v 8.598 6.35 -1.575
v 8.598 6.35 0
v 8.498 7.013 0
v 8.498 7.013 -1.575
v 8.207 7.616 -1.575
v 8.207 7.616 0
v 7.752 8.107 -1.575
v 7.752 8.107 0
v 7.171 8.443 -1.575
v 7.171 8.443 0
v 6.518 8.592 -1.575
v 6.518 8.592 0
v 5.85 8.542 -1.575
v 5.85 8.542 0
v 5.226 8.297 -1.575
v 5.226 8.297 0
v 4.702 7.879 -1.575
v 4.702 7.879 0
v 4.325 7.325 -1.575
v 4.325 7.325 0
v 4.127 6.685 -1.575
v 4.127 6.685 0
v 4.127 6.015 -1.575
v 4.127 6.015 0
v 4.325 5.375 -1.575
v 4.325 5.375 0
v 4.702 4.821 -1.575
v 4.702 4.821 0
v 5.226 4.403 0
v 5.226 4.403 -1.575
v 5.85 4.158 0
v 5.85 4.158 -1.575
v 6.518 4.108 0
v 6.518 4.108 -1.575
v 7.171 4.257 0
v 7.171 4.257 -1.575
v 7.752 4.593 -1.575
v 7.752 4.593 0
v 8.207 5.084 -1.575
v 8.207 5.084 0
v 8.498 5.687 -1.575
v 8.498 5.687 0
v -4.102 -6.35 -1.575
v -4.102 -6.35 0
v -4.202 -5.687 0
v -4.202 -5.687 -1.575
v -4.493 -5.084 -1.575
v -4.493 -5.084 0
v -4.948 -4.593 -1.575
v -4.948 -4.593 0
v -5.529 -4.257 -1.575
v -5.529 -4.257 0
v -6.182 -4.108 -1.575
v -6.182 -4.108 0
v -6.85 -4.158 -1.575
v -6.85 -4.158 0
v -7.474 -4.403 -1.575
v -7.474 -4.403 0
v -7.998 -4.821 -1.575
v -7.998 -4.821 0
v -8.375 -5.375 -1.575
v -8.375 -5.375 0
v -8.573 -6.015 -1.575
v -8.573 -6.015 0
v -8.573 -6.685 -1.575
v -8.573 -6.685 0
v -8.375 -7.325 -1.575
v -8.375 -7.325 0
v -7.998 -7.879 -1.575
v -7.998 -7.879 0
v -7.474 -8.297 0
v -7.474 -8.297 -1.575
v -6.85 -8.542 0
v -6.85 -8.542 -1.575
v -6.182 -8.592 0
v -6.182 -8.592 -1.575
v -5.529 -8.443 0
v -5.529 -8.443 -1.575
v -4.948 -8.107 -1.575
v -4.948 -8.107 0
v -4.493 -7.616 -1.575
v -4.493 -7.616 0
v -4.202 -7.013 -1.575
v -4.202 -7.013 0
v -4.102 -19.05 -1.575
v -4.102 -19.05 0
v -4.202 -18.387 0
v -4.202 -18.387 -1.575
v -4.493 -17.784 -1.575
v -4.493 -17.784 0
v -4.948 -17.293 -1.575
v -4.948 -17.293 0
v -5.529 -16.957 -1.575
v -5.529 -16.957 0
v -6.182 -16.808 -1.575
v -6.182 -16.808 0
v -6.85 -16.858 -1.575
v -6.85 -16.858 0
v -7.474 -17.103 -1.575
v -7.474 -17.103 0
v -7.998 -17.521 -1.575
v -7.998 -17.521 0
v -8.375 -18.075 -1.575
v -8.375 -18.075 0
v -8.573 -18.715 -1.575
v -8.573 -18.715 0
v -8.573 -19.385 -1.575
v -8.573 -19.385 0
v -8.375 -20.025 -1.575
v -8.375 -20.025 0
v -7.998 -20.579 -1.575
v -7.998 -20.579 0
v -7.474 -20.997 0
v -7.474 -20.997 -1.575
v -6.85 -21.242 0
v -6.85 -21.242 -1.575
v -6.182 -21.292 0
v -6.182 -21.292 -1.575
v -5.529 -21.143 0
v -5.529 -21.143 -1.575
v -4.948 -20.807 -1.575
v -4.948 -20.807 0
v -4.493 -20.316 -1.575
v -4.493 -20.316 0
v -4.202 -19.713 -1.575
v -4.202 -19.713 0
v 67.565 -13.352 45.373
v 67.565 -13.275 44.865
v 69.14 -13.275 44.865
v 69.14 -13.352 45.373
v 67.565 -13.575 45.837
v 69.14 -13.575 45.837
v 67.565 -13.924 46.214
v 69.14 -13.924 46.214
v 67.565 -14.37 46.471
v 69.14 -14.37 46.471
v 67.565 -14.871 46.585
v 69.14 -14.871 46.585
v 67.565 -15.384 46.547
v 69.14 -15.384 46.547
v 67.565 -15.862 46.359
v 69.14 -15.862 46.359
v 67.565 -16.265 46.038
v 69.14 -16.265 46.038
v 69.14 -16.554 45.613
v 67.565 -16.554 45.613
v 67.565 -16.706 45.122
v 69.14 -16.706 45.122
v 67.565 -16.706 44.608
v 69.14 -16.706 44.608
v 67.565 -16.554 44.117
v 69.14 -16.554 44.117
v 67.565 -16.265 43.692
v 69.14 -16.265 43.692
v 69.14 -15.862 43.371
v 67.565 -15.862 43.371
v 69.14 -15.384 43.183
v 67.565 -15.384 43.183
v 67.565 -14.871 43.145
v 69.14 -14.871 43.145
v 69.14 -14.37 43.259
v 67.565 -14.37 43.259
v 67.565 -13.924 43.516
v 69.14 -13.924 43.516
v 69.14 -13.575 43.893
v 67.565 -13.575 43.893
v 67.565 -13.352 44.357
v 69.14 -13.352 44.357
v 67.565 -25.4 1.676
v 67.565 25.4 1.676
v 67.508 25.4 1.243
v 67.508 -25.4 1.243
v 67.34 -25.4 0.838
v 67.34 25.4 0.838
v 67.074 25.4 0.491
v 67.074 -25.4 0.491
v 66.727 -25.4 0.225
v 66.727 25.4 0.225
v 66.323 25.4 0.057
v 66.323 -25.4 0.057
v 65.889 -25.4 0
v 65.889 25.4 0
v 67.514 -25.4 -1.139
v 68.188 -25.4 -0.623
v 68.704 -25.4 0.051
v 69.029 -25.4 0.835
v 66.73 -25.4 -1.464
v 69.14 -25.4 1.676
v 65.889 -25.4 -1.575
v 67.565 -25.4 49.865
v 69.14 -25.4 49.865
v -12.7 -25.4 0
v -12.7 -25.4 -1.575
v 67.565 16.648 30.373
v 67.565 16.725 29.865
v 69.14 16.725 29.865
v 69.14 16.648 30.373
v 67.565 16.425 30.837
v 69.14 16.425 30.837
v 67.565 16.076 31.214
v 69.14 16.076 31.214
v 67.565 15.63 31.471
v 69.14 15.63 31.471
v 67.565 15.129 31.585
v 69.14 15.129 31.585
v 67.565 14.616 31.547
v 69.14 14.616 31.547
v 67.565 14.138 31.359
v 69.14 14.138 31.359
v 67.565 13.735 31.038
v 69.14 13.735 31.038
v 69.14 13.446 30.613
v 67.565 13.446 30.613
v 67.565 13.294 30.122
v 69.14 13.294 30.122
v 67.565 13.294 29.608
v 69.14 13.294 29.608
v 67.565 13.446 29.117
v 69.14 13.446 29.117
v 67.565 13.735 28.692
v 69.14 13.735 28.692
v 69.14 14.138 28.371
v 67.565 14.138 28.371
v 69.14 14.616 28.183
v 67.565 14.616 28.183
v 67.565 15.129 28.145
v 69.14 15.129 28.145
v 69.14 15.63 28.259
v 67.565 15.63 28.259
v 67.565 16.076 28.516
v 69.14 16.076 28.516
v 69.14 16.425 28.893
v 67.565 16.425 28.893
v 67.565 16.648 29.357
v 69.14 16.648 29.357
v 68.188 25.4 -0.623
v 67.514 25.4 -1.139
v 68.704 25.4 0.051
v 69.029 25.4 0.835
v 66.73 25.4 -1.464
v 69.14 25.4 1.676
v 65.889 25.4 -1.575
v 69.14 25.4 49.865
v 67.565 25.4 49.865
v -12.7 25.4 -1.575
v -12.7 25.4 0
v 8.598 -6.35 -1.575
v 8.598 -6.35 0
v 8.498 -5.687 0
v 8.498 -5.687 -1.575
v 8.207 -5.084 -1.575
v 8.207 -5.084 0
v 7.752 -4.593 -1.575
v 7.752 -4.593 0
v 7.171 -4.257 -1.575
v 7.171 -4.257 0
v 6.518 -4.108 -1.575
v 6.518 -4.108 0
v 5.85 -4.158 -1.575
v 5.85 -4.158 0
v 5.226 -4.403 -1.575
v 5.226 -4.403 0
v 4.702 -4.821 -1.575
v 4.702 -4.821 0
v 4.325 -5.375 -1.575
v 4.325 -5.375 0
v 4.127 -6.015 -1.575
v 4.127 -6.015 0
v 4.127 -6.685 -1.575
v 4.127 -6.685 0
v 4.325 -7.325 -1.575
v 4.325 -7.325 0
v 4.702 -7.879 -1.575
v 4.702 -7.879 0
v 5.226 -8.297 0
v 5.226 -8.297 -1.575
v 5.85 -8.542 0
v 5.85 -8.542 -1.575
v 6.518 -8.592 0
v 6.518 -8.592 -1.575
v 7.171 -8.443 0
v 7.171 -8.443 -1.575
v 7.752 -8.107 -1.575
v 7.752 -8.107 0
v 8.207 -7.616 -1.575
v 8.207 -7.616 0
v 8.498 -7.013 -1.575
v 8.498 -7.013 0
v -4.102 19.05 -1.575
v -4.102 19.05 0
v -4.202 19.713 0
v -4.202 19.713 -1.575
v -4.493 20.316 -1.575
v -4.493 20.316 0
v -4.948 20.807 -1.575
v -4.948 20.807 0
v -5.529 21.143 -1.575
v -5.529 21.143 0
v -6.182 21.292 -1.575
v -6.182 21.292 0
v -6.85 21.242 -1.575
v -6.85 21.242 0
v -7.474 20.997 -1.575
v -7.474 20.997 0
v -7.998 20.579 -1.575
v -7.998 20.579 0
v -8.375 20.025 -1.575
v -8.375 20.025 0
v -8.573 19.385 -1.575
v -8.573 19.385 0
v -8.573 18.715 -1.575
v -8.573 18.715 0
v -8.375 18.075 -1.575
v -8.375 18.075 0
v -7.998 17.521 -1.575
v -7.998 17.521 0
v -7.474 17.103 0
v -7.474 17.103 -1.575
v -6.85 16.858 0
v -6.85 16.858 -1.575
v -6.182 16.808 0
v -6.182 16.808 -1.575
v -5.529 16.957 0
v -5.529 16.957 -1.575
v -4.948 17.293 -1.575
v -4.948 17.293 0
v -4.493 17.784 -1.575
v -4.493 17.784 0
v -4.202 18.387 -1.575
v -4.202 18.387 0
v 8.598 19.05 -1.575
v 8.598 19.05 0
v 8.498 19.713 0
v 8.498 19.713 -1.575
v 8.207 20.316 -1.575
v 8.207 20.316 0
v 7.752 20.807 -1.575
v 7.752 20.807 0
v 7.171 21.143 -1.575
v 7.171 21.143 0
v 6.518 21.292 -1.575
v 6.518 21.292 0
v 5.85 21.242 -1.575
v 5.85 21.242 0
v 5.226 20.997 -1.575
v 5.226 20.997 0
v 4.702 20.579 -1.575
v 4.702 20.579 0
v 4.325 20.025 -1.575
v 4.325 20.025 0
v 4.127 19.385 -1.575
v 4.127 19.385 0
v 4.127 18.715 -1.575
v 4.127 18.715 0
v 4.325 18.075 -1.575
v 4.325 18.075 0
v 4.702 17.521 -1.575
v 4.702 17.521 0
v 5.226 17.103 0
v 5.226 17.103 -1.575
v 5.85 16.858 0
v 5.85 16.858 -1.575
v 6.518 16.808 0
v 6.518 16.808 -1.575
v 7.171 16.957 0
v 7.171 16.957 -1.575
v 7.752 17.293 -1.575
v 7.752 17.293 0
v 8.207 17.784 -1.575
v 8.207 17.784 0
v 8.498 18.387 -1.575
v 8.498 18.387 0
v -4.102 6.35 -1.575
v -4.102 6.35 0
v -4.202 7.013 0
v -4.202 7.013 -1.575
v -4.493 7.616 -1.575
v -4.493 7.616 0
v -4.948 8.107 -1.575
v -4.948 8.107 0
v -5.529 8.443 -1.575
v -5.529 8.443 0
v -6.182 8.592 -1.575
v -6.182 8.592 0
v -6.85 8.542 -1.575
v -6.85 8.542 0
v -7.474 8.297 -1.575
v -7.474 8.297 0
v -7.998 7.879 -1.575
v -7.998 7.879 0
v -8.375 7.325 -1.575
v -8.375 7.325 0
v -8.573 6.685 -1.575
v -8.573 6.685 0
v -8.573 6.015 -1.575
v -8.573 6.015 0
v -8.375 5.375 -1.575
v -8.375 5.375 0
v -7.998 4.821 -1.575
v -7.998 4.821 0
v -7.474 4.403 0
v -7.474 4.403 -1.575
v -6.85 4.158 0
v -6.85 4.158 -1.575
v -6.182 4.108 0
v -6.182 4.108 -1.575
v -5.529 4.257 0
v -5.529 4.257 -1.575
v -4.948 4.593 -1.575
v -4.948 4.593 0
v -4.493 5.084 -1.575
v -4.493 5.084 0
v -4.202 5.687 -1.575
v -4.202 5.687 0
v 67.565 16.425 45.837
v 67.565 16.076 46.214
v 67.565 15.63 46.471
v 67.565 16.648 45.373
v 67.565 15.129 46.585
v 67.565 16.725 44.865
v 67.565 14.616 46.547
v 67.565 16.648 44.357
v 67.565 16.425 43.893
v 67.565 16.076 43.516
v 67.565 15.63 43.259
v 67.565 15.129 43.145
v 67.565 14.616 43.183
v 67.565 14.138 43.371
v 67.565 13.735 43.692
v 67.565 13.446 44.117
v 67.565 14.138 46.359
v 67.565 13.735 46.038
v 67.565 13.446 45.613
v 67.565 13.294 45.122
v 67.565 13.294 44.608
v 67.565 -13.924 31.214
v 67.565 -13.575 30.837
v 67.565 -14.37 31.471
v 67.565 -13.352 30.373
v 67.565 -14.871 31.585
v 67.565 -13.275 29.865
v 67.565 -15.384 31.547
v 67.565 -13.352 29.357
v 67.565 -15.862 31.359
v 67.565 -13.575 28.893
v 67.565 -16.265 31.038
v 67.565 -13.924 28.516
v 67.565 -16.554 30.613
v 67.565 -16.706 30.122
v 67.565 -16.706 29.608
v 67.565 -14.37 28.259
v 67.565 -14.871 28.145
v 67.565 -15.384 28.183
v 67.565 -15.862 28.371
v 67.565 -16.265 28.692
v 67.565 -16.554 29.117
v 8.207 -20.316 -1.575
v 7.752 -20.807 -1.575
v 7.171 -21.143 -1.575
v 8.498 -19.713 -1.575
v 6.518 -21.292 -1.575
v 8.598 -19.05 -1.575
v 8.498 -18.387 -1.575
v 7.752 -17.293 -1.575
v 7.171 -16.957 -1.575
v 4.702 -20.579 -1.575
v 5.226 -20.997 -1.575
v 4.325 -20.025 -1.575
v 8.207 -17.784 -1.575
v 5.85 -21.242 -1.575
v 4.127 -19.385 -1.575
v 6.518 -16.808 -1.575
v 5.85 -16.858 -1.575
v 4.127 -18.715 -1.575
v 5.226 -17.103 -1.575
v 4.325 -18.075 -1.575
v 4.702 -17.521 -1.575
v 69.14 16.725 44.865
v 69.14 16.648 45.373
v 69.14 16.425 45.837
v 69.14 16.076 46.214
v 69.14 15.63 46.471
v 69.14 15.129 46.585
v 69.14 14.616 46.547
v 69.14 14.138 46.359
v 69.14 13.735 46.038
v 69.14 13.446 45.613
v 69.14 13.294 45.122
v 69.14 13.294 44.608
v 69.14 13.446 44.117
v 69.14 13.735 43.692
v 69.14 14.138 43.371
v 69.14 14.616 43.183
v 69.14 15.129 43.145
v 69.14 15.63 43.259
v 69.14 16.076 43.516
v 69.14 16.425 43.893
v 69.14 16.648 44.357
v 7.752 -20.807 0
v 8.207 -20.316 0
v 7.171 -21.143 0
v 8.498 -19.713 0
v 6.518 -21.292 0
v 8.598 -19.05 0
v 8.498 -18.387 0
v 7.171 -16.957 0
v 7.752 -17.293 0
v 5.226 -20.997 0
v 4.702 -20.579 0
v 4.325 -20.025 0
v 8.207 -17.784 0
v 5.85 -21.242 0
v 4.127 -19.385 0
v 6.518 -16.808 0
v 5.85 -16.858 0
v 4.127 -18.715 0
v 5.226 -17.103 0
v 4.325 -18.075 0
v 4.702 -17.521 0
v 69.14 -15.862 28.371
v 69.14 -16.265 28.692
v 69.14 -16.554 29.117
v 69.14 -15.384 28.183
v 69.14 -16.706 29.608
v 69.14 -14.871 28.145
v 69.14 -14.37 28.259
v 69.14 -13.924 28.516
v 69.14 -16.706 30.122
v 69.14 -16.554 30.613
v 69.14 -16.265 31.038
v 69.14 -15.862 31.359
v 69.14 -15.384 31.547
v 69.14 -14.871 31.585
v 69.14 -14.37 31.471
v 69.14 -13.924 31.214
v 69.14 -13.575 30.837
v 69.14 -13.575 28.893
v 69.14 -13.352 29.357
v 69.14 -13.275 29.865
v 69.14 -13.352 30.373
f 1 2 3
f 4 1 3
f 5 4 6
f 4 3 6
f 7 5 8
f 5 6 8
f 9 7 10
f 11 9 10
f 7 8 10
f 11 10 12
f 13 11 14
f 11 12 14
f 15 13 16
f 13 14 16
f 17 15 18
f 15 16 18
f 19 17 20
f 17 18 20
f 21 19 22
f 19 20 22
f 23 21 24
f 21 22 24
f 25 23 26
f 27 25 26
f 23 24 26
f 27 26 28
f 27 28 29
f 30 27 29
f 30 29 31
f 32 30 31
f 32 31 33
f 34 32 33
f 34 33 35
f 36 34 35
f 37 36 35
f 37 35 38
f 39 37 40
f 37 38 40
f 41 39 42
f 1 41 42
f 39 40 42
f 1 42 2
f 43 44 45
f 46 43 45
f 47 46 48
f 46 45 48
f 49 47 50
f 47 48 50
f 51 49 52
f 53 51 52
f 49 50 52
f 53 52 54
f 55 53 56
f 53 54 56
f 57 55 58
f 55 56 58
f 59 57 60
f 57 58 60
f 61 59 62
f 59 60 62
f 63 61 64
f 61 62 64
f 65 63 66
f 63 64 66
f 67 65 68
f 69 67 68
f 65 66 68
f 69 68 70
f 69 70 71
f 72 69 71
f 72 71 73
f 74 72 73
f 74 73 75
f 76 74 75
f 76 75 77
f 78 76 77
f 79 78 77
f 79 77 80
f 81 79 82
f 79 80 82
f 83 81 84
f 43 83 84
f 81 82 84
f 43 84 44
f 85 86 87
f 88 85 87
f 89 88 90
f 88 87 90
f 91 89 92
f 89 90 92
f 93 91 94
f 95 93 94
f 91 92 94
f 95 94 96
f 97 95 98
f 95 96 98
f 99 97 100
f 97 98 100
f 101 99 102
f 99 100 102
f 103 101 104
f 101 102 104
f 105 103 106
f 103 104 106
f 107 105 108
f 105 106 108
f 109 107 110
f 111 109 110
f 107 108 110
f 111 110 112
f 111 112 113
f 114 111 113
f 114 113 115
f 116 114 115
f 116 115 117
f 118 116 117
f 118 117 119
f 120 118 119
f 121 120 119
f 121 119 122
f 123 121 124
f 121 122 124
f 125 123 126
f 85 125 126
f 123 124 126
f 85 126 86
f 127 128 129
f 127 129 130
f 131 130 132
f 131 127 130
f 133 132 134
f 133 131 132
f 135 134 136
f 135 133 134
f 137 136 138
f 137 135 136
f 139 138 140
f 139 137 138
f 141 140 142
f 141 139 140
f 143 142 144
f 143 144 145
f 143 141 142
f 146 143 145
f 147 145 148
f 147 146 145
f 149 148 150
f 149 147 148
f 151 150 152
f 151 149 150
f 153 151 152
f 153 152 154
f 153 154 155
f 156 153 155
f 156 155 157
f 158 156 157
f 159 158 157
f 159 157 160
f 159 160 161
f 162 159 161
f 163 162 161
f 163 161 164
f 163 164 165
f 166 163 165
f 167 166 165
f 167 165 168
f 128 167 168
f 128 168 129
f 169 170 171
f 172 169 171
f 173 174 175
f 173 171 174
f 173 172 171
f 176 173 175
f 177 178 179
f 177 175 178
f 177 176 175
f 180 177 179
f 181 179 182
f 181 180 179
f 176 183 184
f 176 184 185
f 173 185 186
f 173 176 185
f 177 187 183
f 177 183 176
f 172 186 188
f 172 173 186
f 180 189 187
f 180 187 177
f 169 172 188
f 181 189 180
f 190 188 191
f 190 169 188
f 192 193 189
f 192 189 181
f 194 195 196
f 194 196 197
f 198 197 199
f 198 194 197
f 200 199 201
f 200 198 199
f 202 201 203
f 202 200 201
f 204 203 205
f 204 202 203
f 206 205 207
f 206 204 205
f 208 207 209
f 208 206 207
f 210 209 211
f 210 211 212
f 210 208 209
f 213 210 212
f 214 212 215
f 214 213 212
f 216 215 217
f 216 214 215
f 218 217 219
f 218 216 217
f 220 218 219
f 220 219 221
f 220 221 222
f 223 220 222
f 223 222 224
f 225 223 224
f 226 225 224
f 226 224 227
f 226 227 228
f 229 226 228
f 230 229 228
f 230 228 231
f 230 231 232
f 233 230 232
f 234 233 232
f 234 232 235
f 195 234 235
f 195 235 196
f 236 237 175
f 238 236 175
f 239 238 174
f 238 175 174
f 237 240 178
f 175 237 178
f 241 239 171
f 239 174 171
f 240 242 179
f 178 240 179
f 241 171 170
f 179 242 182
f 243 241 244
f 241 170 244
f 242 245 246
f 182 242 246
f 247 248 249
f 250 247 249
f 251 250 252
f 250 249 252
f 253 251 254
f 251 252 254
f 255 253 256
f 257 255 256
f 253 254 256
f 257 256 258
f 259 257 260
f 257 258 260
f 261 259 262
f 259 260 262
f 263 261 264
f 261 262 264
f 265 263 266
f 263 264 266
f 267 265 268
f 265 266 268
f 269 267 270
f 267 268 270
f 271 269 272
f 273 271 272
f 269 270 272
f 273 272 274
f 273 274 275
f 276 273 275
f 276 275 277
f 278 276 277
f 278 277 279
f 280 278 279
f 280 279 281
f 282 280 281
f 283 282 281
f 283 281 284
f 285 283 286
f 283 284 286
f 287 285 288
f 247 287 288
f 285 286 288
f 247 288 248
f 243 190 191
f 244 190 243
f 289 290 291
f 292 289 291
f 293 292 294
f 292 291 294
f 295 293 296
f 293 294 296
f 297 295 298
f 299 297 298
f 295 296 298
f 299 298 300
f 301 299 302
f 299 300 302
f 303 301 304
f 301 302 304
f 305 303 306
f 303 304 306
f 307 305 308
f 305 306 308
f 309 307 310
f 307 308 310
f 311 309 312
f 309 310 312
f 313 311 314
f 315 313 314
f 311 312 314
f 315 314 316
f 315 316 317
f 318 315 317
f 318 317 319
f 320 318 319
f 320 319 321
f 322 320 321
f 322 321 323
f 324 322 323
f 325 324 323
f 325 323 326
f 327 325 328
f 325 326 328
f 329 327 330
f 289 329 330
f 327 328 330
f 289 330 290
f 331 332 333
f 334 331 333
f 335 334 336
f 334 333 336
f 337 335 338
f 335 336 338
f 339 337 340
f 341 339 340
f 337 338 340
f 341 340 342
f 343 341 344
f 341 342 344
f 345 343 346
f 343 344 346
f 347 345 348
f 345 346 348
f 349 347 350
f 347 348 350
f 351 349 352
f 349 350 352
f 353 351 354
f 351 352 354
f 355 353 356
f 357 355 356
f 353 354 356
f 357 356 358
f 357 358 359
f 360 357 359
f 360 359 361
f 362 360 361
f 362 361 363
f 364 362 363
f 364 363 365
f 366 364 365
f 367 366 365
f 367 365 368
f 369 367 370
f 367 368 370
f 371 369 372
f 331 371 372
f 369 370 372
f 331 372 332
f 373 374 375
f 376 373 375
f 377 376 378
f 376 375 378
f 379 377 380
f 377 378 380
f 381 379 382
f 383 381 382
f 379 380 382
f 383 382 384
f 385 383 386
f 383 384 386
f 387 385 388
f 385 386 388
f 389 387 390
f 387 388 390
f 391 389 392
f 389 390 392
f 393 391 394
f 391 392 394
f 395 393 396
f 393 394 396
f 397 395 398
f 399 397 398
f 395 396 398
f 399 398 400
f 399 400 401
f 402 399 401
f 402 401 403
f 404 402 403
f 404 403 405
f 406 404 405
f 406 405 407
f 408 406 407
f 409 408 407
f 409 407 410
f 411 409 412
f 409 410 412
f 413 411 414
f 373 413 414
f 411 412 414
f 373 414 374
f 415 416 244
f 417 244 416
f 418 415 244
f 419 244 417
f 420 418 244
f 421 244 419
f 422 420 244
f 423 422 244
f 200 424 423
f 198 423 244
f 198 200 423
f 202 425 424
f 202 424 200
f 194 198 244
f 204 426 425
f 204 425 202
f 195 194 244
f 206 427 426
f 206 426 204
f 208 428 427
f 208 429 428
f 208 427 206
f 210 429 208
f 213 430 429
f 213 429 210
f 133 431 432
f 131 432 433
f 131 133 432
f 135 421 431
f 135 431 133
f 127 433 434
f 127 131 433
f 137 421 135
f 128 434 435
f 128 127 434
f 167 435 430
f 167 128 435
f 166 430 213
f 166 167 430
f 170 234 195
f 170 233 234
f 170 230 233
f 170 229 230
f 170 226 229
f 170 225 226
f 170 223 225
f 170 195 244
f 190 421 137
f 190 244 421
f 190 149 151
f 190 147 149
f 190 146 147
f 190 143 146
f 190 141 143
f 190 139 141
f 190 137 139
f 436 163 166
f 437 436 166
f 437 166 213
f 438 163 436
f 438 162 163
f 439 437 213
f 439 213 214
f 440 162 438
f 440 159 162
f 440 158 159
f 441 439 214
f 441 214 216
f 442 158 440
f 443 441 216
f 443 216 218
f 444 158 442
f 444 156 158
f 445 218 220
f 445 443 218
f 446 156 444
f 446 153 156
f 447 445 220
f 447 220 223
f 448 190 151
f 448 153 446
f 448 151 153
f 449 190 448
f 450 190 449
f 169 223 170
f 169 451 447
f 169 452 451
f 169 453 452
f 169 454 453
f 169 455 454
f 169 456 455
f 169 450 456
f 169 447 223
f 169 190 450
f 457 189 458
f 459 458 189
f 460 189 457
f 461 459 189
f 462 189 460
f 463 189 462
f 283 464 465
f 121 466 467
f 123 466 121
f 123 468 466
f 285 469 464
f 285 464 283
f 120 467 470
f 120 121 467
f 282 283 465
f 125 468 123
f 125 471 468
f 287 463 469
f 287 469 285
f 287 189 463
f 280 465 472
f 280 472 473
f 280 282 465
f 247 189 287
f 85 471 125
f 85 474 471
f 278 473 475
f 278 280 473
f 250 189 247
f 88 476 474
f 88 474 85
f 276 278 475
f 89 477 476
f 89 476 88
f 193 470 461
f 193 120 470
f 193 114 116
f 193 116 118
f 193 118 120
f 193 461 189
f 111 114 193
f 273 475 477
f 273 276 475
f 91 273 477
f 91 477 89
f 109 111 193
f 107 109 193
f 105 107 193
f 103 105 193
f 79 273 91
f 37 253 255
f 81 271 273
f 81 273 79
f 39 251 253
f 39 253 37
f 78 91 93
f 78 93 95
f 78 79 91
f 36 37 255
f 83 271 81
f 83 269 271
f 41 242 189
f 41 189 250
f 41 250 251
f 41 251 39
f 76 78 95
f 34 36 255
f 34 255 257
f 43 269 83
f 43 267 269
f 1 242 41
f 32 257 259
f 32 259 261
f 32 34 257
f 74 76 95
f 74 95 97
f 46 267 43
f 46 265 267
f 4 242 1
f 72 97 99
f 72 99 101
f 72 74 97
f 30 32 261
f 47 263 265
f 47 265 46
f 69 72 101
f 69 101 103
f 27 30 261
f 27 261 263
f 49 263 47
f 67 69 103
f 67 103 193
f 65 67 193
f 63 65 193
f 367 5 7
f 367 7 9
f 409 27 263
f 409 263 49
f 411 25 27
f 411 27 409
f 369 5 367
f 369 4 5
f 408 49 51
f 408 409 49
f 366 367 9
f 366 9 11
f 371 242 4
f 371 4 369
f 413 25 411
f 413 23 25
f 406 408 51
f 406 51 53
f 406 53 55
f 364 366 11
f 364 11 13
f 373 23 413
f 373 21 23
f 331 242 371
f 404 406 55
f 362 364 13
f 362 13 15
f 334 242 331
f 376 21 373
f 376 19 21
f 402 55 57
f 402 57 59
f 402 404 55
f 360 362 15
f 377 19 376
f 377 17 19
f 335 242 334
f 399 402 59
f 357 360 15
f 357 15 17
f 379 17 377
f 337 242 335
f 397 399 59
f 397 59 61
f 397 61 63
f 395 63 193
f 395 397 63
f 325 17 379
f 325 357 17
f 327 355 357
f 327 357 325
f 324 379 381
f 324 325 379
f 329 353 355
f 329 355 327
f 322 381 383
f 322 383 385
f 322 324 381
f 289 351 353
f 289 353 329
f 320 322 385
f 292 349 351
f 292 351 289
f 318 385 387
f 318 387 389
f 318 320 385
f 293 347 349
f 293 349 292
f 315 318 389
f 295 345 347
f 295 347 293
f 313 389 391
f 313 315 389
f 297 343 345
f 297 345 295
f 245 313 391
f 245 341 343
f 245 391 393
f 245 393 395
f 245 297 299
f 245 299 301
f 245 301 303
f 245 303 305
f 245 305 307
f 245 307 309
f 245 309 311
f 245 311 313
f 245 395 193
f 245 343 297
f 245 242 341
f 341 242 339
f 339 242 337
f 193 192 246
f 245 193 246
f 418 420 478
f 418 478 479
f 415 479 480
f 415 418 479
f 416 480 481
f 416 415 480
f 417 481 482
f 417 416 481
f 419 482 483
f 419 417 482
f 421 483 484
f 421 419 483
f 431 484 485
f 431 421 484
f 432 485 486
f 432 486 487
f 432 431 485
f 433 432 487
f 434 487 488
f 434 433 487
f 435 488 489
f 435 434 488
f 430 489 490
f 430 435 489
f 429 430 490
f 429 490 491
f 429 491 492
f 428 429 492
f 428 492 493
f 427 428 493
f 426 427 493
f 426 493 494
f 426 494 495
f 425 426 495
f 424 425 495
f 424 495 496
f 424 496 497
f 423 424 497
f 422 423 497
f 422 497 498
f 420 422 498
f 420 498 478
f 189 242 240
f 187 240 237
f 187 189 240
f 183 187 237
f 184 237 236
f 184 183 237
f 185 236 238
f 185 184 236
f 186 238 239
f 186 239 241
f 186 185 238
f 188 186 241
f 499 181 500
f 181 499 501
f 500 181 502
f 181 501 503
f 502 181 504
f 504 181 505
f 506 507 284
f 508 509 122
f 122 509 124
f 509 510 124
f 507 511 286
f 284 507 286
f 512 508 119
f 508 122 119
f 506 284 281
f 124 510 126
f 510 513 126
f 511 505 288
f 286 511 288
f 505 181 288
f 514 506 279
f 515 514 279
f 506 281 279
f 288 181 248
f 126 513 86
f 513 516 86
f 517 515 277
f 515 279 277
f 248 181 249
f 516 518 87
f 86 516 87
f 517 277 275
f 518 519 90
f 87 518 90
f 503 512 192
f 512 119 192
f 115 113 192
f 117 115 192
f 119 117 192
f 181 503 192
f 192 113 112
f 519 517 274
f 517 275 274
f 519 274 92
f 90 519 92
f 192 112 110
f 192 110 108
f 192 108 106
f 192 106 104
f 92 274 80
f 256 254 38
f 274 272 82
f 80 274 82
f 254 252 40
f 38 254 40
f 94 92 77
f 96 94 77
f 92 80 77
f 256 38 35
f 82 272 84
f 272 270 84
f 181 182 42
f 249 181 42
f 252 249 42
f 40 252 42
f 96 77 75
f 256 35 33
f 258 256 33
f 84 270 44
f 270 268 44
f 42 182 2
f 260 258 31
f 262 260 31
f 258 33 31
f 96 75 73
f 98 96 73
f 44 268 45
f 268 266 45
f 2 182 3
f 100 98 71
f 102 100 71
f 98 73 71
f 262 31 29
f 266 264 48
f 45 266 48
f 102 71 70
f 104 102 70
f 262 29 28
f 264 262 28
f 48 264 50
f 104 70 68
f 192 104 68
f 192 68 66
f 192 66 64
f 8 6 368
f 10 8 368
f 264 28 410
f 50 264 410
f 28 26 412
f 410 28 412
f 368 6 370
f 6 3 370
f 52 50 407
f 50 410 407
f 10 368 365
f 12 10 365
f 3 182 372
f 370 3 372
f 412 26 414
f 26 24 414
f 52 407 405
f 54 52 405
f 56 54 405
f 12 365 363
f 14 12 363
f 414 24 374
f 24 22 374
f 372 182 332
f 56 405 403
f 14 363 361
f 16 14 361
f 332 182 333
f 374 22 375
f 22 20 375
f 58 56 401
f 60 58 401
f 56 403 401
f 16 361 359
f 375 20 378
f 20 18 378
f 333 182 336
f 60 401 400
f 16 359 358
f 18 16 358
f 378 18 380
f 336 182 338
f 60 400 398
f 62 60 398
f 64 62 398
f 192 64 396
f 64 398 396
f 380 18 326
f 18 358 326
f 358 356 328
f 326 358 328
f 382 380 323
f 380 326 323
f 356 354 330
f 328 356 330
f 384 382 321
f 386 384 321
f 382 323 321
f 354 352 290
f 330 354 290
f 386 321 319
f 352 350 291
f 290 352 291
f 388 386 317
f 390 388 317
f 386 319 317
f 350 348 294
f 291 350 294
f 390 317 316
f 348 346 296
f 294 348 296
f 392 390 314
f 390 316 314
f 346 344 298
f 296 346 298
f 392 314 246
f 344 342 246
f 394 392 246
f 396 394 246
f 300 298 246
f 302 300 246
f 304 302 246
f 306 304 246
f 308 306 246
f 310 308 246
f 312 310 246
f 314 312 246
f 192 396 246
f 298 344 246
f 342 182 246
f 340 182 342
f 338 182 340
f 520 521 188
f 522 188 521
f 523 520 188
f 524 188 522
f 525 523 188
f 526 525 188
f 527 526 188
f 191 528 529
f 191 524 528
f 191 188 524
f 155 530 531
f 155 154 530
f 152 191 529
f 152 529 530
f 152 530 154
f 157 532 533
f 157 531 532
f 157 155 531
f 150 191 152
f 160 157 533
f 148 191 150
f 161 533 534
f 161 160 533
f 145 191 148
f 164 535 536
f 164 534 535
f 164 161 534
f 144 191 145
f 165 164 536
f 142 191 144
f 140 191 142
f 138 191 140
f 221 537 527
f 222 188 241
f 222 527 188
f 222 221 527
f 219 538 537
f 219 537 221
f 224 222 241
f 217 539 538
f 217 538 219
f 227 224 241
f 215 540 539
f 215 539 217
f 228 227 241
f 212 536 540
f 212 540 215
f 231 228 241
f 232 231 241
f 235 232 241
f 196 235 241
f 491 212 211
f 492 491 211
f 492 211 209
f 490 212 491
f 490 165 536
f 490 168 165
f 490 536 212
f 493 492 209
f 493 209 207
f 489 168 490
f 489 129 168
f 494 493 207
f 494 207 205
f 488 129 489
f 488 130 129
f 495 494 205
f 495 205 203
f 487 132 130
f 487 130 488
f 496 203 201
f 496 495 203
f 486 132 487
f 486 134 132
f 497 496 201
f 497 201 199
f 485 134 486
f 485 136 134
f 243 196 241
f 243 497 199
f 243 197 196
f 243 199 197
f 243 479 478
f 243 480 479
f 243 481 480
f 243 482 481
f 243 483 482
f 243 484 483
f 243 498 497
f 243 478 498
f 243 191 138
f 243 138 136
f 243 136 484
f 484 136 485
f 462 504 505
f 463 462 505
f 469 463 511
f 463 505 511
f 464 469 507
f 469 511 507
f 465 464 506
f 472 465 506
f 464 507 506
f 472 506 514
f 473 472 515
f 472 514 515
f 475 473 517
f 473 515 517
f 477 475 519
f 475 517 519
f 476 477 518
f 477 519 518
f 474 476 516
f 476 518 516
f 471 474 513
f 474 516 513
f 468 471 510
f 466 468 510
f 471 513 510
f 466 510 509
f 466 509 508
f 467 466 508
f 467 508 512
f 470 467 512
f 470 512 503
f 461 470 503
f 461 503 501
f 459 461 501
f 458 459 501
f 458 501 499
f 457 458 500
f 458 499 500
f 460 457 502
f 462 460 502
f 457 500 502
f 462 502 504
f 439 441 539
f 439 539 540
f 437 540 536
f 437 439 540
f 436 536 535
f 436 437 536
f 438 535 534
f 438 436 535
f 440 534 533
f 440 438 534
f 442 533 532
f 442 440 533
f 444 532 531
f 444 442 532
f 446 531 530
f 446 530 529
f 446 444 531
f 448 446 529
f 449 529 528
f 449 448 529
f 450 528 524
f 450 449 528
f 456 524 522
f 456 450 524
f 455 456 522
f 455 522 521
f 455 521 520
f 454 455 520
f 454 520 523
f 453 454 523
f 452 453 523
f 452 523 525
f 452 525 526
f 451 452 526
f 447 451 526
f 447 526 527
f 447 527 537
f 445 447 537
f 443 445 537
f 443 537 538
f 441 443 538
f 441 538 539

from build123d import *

# Parameters (mm, degrees)
SKETCH1_R                  = 2.2479
SKETCH1_R_2                = 1.725
BASE_FLANGE1_DEPTH         = 1.5748
SKETCHED_START             = 68.796428764
SKETCHED_BEND1_OUTLINE_W   = 50.8
SKETCHED_BEND1_OUTLINE_H   = 1.5748
SKETCHED_BEND1_DEPTH       = 48.903571236
SKETCHED_START_2           = 65.888620508
SKETCHED_BEND1_2_OUTLINE_W = 50.8
SKETCHED_BEND1_2_OUTLINE_H = 49.865020508
SKETCHED_BEND1_2_OUTLINE_R = 1.725
SKETCHED_BEND1_2_DEPTH     = 3.2512
SKETCHED_START_3           = -26
SKETCHED_BEND1_3_DEPTH     = 52


with BuildPart() as part:
    # Base-Flange1: sheet metal written as solids
    # Sketch1 → Base-Flange1 (new body)
    with BuildSketch(Plane.XY):
        Polygon((12.7, 25.4), (117.7, 25.4), (117.7, -25.4), (12.7, -25.4), (-12.7, -25.4), (-12.7, 25.4), align=None)
        with Locations((-6.35, 19.05)):
            Circle(SKETCH1_R, mode=Mode.SUBTRACT)
        with Locations((6.35, 19.05)):
            Circle(SKETCH1_R, mode=Mode.SUBTRACT)
        with Locations((6.35, 6.35)):
            Circle(SKETCH1_R, mode=Mode.SUBTRACT)
        with Locations((6.35, -6.35)):
            Circle(SKETCH1_R, mode=Mode.SUBTRACT)
        with Locations((6.35, -19.05)):
            Circle(SKETCH1_R, mode=Mode.SUBTRACT)
        with Locations((-6.35, 6.35)):
            Circle(SKETCH1_R, mode=Mode.SUBTRACT)
        with Locations((-6.35, -6.35)):
            Circle(SKETCH1_R, mode=Mode.SUBTRACT)
        with Locations((-6.35, -19.05)):
            Circle(SKETCH1_R, mode=Mode.SUBTRACT)
        with Locations((97.7, 15)):
            Circle(SKETCH1_R_2, mode=Mode.SUBTRACT)
        with Locations((112.7, 15)):
            Circle(SKETCH1_R_2, mode=Mode.SUBTRACT)
        with Locations((112.7, -15)):
            Circle(SKETCH1_R_2, mode=Mode.SUBTRACT)
        with Locations((97.7, -15)):
            Circle(SKETCH1_R_2, mode=Mode.SUBTRACT)
    extrude(amount=-BASE_FLANGE1_DEPTH)

    # Sketched Bend1: read off the stored shape, not the designer's step
    # Sketched Bend1 outline → Sketched Bend1 (cut)
    with BuildSketch(Plane.YZ.offset(SKETCHED_START)):
        with Locations((0, -0.7874)):
            Rectangle(SKETCHED_BEND1_OUTLINE_W, SKETCHED_BEND1_OUTLINE_H)
    extrude(amount=SKETCHED_BEND1_DEPTH, mode=Mode.SUBTRACT)

    # Sketched Bend1 2 outline → Sketched Bend1 2 (add)
    with BuildSketch(Plane.YZ.offset(SKETCHED_START_2)):
        with Locations((0, 24.932510254)):
            Rectangle(SKETCHED_BEND1_2_OUTLINE_W, SKETCHED_BEND1_2_OUTLINE_H)
        with Locations((-15, 29.865020508)):
            Circle(SKETCHED_BEND1_2_OUTLINE_R, mode=Mode.SUBTRACT)
        with Locations((-15, 44.865020508)):
            Circle(SKETCHED_BEND1_2_OUTLINE_R, mode=Mode.SUBTRACT)
        with Locations((15, 29.865020508)):
            Circle(SKETCHED_BEND1_2_OUTLINE_R, mode=Mode.SUBTRACT)
        with Locations((15, 44.865020508)):
            Circle(SKETCHED_BEND1_2_OUTLINE_R, mode=Mode.SUBTRACT)
    extrude(amount=SKETCHED_BEND1_2_DEPTH)

    # Sketched Bend1 3 outline → Sketched Bend1 3 (cut)
    with BuildSketch(Plane(origin=(0, 0, 0), x_dir=(1, 0, 0), z_dir=(0, 1, 0)).offset(SKETCHED_START_3)):
        with BuildLine():
            ThreePointArc((65.888620508, 1.5748), (68.187566075, 0.622545567), (69.139820508, -1.6764))
            Line((69.139820508, -1.6764), (69.139820508, 0))
            Line((69.139820508, 0), (68.796428764, 0))
            Line((68.796428764, 0), (68.796428764, 1.5748))
            Line((68.796428764, 1.5748), (65.888620508, 1.5748))
        make_face()
        with BuildLine():
            Line((67.565020508, -49.865020508), (67.565020508, -1.6764))
            ThreePointArc((67.565020508, -1.6764), (67.074014316, -0.491006192), (65.888620508, 0))
            Line((65.888620508, 0), (65.888620508, -49.865020508))
            Line((65.888620508, -49.865020508), (67.565020508, -49.865020508))
        make_face()
    extrude(amount=SKETCHED_BEND1_3_DEPTH, mode=Mode.SUBTRACT)


solid = part.part
